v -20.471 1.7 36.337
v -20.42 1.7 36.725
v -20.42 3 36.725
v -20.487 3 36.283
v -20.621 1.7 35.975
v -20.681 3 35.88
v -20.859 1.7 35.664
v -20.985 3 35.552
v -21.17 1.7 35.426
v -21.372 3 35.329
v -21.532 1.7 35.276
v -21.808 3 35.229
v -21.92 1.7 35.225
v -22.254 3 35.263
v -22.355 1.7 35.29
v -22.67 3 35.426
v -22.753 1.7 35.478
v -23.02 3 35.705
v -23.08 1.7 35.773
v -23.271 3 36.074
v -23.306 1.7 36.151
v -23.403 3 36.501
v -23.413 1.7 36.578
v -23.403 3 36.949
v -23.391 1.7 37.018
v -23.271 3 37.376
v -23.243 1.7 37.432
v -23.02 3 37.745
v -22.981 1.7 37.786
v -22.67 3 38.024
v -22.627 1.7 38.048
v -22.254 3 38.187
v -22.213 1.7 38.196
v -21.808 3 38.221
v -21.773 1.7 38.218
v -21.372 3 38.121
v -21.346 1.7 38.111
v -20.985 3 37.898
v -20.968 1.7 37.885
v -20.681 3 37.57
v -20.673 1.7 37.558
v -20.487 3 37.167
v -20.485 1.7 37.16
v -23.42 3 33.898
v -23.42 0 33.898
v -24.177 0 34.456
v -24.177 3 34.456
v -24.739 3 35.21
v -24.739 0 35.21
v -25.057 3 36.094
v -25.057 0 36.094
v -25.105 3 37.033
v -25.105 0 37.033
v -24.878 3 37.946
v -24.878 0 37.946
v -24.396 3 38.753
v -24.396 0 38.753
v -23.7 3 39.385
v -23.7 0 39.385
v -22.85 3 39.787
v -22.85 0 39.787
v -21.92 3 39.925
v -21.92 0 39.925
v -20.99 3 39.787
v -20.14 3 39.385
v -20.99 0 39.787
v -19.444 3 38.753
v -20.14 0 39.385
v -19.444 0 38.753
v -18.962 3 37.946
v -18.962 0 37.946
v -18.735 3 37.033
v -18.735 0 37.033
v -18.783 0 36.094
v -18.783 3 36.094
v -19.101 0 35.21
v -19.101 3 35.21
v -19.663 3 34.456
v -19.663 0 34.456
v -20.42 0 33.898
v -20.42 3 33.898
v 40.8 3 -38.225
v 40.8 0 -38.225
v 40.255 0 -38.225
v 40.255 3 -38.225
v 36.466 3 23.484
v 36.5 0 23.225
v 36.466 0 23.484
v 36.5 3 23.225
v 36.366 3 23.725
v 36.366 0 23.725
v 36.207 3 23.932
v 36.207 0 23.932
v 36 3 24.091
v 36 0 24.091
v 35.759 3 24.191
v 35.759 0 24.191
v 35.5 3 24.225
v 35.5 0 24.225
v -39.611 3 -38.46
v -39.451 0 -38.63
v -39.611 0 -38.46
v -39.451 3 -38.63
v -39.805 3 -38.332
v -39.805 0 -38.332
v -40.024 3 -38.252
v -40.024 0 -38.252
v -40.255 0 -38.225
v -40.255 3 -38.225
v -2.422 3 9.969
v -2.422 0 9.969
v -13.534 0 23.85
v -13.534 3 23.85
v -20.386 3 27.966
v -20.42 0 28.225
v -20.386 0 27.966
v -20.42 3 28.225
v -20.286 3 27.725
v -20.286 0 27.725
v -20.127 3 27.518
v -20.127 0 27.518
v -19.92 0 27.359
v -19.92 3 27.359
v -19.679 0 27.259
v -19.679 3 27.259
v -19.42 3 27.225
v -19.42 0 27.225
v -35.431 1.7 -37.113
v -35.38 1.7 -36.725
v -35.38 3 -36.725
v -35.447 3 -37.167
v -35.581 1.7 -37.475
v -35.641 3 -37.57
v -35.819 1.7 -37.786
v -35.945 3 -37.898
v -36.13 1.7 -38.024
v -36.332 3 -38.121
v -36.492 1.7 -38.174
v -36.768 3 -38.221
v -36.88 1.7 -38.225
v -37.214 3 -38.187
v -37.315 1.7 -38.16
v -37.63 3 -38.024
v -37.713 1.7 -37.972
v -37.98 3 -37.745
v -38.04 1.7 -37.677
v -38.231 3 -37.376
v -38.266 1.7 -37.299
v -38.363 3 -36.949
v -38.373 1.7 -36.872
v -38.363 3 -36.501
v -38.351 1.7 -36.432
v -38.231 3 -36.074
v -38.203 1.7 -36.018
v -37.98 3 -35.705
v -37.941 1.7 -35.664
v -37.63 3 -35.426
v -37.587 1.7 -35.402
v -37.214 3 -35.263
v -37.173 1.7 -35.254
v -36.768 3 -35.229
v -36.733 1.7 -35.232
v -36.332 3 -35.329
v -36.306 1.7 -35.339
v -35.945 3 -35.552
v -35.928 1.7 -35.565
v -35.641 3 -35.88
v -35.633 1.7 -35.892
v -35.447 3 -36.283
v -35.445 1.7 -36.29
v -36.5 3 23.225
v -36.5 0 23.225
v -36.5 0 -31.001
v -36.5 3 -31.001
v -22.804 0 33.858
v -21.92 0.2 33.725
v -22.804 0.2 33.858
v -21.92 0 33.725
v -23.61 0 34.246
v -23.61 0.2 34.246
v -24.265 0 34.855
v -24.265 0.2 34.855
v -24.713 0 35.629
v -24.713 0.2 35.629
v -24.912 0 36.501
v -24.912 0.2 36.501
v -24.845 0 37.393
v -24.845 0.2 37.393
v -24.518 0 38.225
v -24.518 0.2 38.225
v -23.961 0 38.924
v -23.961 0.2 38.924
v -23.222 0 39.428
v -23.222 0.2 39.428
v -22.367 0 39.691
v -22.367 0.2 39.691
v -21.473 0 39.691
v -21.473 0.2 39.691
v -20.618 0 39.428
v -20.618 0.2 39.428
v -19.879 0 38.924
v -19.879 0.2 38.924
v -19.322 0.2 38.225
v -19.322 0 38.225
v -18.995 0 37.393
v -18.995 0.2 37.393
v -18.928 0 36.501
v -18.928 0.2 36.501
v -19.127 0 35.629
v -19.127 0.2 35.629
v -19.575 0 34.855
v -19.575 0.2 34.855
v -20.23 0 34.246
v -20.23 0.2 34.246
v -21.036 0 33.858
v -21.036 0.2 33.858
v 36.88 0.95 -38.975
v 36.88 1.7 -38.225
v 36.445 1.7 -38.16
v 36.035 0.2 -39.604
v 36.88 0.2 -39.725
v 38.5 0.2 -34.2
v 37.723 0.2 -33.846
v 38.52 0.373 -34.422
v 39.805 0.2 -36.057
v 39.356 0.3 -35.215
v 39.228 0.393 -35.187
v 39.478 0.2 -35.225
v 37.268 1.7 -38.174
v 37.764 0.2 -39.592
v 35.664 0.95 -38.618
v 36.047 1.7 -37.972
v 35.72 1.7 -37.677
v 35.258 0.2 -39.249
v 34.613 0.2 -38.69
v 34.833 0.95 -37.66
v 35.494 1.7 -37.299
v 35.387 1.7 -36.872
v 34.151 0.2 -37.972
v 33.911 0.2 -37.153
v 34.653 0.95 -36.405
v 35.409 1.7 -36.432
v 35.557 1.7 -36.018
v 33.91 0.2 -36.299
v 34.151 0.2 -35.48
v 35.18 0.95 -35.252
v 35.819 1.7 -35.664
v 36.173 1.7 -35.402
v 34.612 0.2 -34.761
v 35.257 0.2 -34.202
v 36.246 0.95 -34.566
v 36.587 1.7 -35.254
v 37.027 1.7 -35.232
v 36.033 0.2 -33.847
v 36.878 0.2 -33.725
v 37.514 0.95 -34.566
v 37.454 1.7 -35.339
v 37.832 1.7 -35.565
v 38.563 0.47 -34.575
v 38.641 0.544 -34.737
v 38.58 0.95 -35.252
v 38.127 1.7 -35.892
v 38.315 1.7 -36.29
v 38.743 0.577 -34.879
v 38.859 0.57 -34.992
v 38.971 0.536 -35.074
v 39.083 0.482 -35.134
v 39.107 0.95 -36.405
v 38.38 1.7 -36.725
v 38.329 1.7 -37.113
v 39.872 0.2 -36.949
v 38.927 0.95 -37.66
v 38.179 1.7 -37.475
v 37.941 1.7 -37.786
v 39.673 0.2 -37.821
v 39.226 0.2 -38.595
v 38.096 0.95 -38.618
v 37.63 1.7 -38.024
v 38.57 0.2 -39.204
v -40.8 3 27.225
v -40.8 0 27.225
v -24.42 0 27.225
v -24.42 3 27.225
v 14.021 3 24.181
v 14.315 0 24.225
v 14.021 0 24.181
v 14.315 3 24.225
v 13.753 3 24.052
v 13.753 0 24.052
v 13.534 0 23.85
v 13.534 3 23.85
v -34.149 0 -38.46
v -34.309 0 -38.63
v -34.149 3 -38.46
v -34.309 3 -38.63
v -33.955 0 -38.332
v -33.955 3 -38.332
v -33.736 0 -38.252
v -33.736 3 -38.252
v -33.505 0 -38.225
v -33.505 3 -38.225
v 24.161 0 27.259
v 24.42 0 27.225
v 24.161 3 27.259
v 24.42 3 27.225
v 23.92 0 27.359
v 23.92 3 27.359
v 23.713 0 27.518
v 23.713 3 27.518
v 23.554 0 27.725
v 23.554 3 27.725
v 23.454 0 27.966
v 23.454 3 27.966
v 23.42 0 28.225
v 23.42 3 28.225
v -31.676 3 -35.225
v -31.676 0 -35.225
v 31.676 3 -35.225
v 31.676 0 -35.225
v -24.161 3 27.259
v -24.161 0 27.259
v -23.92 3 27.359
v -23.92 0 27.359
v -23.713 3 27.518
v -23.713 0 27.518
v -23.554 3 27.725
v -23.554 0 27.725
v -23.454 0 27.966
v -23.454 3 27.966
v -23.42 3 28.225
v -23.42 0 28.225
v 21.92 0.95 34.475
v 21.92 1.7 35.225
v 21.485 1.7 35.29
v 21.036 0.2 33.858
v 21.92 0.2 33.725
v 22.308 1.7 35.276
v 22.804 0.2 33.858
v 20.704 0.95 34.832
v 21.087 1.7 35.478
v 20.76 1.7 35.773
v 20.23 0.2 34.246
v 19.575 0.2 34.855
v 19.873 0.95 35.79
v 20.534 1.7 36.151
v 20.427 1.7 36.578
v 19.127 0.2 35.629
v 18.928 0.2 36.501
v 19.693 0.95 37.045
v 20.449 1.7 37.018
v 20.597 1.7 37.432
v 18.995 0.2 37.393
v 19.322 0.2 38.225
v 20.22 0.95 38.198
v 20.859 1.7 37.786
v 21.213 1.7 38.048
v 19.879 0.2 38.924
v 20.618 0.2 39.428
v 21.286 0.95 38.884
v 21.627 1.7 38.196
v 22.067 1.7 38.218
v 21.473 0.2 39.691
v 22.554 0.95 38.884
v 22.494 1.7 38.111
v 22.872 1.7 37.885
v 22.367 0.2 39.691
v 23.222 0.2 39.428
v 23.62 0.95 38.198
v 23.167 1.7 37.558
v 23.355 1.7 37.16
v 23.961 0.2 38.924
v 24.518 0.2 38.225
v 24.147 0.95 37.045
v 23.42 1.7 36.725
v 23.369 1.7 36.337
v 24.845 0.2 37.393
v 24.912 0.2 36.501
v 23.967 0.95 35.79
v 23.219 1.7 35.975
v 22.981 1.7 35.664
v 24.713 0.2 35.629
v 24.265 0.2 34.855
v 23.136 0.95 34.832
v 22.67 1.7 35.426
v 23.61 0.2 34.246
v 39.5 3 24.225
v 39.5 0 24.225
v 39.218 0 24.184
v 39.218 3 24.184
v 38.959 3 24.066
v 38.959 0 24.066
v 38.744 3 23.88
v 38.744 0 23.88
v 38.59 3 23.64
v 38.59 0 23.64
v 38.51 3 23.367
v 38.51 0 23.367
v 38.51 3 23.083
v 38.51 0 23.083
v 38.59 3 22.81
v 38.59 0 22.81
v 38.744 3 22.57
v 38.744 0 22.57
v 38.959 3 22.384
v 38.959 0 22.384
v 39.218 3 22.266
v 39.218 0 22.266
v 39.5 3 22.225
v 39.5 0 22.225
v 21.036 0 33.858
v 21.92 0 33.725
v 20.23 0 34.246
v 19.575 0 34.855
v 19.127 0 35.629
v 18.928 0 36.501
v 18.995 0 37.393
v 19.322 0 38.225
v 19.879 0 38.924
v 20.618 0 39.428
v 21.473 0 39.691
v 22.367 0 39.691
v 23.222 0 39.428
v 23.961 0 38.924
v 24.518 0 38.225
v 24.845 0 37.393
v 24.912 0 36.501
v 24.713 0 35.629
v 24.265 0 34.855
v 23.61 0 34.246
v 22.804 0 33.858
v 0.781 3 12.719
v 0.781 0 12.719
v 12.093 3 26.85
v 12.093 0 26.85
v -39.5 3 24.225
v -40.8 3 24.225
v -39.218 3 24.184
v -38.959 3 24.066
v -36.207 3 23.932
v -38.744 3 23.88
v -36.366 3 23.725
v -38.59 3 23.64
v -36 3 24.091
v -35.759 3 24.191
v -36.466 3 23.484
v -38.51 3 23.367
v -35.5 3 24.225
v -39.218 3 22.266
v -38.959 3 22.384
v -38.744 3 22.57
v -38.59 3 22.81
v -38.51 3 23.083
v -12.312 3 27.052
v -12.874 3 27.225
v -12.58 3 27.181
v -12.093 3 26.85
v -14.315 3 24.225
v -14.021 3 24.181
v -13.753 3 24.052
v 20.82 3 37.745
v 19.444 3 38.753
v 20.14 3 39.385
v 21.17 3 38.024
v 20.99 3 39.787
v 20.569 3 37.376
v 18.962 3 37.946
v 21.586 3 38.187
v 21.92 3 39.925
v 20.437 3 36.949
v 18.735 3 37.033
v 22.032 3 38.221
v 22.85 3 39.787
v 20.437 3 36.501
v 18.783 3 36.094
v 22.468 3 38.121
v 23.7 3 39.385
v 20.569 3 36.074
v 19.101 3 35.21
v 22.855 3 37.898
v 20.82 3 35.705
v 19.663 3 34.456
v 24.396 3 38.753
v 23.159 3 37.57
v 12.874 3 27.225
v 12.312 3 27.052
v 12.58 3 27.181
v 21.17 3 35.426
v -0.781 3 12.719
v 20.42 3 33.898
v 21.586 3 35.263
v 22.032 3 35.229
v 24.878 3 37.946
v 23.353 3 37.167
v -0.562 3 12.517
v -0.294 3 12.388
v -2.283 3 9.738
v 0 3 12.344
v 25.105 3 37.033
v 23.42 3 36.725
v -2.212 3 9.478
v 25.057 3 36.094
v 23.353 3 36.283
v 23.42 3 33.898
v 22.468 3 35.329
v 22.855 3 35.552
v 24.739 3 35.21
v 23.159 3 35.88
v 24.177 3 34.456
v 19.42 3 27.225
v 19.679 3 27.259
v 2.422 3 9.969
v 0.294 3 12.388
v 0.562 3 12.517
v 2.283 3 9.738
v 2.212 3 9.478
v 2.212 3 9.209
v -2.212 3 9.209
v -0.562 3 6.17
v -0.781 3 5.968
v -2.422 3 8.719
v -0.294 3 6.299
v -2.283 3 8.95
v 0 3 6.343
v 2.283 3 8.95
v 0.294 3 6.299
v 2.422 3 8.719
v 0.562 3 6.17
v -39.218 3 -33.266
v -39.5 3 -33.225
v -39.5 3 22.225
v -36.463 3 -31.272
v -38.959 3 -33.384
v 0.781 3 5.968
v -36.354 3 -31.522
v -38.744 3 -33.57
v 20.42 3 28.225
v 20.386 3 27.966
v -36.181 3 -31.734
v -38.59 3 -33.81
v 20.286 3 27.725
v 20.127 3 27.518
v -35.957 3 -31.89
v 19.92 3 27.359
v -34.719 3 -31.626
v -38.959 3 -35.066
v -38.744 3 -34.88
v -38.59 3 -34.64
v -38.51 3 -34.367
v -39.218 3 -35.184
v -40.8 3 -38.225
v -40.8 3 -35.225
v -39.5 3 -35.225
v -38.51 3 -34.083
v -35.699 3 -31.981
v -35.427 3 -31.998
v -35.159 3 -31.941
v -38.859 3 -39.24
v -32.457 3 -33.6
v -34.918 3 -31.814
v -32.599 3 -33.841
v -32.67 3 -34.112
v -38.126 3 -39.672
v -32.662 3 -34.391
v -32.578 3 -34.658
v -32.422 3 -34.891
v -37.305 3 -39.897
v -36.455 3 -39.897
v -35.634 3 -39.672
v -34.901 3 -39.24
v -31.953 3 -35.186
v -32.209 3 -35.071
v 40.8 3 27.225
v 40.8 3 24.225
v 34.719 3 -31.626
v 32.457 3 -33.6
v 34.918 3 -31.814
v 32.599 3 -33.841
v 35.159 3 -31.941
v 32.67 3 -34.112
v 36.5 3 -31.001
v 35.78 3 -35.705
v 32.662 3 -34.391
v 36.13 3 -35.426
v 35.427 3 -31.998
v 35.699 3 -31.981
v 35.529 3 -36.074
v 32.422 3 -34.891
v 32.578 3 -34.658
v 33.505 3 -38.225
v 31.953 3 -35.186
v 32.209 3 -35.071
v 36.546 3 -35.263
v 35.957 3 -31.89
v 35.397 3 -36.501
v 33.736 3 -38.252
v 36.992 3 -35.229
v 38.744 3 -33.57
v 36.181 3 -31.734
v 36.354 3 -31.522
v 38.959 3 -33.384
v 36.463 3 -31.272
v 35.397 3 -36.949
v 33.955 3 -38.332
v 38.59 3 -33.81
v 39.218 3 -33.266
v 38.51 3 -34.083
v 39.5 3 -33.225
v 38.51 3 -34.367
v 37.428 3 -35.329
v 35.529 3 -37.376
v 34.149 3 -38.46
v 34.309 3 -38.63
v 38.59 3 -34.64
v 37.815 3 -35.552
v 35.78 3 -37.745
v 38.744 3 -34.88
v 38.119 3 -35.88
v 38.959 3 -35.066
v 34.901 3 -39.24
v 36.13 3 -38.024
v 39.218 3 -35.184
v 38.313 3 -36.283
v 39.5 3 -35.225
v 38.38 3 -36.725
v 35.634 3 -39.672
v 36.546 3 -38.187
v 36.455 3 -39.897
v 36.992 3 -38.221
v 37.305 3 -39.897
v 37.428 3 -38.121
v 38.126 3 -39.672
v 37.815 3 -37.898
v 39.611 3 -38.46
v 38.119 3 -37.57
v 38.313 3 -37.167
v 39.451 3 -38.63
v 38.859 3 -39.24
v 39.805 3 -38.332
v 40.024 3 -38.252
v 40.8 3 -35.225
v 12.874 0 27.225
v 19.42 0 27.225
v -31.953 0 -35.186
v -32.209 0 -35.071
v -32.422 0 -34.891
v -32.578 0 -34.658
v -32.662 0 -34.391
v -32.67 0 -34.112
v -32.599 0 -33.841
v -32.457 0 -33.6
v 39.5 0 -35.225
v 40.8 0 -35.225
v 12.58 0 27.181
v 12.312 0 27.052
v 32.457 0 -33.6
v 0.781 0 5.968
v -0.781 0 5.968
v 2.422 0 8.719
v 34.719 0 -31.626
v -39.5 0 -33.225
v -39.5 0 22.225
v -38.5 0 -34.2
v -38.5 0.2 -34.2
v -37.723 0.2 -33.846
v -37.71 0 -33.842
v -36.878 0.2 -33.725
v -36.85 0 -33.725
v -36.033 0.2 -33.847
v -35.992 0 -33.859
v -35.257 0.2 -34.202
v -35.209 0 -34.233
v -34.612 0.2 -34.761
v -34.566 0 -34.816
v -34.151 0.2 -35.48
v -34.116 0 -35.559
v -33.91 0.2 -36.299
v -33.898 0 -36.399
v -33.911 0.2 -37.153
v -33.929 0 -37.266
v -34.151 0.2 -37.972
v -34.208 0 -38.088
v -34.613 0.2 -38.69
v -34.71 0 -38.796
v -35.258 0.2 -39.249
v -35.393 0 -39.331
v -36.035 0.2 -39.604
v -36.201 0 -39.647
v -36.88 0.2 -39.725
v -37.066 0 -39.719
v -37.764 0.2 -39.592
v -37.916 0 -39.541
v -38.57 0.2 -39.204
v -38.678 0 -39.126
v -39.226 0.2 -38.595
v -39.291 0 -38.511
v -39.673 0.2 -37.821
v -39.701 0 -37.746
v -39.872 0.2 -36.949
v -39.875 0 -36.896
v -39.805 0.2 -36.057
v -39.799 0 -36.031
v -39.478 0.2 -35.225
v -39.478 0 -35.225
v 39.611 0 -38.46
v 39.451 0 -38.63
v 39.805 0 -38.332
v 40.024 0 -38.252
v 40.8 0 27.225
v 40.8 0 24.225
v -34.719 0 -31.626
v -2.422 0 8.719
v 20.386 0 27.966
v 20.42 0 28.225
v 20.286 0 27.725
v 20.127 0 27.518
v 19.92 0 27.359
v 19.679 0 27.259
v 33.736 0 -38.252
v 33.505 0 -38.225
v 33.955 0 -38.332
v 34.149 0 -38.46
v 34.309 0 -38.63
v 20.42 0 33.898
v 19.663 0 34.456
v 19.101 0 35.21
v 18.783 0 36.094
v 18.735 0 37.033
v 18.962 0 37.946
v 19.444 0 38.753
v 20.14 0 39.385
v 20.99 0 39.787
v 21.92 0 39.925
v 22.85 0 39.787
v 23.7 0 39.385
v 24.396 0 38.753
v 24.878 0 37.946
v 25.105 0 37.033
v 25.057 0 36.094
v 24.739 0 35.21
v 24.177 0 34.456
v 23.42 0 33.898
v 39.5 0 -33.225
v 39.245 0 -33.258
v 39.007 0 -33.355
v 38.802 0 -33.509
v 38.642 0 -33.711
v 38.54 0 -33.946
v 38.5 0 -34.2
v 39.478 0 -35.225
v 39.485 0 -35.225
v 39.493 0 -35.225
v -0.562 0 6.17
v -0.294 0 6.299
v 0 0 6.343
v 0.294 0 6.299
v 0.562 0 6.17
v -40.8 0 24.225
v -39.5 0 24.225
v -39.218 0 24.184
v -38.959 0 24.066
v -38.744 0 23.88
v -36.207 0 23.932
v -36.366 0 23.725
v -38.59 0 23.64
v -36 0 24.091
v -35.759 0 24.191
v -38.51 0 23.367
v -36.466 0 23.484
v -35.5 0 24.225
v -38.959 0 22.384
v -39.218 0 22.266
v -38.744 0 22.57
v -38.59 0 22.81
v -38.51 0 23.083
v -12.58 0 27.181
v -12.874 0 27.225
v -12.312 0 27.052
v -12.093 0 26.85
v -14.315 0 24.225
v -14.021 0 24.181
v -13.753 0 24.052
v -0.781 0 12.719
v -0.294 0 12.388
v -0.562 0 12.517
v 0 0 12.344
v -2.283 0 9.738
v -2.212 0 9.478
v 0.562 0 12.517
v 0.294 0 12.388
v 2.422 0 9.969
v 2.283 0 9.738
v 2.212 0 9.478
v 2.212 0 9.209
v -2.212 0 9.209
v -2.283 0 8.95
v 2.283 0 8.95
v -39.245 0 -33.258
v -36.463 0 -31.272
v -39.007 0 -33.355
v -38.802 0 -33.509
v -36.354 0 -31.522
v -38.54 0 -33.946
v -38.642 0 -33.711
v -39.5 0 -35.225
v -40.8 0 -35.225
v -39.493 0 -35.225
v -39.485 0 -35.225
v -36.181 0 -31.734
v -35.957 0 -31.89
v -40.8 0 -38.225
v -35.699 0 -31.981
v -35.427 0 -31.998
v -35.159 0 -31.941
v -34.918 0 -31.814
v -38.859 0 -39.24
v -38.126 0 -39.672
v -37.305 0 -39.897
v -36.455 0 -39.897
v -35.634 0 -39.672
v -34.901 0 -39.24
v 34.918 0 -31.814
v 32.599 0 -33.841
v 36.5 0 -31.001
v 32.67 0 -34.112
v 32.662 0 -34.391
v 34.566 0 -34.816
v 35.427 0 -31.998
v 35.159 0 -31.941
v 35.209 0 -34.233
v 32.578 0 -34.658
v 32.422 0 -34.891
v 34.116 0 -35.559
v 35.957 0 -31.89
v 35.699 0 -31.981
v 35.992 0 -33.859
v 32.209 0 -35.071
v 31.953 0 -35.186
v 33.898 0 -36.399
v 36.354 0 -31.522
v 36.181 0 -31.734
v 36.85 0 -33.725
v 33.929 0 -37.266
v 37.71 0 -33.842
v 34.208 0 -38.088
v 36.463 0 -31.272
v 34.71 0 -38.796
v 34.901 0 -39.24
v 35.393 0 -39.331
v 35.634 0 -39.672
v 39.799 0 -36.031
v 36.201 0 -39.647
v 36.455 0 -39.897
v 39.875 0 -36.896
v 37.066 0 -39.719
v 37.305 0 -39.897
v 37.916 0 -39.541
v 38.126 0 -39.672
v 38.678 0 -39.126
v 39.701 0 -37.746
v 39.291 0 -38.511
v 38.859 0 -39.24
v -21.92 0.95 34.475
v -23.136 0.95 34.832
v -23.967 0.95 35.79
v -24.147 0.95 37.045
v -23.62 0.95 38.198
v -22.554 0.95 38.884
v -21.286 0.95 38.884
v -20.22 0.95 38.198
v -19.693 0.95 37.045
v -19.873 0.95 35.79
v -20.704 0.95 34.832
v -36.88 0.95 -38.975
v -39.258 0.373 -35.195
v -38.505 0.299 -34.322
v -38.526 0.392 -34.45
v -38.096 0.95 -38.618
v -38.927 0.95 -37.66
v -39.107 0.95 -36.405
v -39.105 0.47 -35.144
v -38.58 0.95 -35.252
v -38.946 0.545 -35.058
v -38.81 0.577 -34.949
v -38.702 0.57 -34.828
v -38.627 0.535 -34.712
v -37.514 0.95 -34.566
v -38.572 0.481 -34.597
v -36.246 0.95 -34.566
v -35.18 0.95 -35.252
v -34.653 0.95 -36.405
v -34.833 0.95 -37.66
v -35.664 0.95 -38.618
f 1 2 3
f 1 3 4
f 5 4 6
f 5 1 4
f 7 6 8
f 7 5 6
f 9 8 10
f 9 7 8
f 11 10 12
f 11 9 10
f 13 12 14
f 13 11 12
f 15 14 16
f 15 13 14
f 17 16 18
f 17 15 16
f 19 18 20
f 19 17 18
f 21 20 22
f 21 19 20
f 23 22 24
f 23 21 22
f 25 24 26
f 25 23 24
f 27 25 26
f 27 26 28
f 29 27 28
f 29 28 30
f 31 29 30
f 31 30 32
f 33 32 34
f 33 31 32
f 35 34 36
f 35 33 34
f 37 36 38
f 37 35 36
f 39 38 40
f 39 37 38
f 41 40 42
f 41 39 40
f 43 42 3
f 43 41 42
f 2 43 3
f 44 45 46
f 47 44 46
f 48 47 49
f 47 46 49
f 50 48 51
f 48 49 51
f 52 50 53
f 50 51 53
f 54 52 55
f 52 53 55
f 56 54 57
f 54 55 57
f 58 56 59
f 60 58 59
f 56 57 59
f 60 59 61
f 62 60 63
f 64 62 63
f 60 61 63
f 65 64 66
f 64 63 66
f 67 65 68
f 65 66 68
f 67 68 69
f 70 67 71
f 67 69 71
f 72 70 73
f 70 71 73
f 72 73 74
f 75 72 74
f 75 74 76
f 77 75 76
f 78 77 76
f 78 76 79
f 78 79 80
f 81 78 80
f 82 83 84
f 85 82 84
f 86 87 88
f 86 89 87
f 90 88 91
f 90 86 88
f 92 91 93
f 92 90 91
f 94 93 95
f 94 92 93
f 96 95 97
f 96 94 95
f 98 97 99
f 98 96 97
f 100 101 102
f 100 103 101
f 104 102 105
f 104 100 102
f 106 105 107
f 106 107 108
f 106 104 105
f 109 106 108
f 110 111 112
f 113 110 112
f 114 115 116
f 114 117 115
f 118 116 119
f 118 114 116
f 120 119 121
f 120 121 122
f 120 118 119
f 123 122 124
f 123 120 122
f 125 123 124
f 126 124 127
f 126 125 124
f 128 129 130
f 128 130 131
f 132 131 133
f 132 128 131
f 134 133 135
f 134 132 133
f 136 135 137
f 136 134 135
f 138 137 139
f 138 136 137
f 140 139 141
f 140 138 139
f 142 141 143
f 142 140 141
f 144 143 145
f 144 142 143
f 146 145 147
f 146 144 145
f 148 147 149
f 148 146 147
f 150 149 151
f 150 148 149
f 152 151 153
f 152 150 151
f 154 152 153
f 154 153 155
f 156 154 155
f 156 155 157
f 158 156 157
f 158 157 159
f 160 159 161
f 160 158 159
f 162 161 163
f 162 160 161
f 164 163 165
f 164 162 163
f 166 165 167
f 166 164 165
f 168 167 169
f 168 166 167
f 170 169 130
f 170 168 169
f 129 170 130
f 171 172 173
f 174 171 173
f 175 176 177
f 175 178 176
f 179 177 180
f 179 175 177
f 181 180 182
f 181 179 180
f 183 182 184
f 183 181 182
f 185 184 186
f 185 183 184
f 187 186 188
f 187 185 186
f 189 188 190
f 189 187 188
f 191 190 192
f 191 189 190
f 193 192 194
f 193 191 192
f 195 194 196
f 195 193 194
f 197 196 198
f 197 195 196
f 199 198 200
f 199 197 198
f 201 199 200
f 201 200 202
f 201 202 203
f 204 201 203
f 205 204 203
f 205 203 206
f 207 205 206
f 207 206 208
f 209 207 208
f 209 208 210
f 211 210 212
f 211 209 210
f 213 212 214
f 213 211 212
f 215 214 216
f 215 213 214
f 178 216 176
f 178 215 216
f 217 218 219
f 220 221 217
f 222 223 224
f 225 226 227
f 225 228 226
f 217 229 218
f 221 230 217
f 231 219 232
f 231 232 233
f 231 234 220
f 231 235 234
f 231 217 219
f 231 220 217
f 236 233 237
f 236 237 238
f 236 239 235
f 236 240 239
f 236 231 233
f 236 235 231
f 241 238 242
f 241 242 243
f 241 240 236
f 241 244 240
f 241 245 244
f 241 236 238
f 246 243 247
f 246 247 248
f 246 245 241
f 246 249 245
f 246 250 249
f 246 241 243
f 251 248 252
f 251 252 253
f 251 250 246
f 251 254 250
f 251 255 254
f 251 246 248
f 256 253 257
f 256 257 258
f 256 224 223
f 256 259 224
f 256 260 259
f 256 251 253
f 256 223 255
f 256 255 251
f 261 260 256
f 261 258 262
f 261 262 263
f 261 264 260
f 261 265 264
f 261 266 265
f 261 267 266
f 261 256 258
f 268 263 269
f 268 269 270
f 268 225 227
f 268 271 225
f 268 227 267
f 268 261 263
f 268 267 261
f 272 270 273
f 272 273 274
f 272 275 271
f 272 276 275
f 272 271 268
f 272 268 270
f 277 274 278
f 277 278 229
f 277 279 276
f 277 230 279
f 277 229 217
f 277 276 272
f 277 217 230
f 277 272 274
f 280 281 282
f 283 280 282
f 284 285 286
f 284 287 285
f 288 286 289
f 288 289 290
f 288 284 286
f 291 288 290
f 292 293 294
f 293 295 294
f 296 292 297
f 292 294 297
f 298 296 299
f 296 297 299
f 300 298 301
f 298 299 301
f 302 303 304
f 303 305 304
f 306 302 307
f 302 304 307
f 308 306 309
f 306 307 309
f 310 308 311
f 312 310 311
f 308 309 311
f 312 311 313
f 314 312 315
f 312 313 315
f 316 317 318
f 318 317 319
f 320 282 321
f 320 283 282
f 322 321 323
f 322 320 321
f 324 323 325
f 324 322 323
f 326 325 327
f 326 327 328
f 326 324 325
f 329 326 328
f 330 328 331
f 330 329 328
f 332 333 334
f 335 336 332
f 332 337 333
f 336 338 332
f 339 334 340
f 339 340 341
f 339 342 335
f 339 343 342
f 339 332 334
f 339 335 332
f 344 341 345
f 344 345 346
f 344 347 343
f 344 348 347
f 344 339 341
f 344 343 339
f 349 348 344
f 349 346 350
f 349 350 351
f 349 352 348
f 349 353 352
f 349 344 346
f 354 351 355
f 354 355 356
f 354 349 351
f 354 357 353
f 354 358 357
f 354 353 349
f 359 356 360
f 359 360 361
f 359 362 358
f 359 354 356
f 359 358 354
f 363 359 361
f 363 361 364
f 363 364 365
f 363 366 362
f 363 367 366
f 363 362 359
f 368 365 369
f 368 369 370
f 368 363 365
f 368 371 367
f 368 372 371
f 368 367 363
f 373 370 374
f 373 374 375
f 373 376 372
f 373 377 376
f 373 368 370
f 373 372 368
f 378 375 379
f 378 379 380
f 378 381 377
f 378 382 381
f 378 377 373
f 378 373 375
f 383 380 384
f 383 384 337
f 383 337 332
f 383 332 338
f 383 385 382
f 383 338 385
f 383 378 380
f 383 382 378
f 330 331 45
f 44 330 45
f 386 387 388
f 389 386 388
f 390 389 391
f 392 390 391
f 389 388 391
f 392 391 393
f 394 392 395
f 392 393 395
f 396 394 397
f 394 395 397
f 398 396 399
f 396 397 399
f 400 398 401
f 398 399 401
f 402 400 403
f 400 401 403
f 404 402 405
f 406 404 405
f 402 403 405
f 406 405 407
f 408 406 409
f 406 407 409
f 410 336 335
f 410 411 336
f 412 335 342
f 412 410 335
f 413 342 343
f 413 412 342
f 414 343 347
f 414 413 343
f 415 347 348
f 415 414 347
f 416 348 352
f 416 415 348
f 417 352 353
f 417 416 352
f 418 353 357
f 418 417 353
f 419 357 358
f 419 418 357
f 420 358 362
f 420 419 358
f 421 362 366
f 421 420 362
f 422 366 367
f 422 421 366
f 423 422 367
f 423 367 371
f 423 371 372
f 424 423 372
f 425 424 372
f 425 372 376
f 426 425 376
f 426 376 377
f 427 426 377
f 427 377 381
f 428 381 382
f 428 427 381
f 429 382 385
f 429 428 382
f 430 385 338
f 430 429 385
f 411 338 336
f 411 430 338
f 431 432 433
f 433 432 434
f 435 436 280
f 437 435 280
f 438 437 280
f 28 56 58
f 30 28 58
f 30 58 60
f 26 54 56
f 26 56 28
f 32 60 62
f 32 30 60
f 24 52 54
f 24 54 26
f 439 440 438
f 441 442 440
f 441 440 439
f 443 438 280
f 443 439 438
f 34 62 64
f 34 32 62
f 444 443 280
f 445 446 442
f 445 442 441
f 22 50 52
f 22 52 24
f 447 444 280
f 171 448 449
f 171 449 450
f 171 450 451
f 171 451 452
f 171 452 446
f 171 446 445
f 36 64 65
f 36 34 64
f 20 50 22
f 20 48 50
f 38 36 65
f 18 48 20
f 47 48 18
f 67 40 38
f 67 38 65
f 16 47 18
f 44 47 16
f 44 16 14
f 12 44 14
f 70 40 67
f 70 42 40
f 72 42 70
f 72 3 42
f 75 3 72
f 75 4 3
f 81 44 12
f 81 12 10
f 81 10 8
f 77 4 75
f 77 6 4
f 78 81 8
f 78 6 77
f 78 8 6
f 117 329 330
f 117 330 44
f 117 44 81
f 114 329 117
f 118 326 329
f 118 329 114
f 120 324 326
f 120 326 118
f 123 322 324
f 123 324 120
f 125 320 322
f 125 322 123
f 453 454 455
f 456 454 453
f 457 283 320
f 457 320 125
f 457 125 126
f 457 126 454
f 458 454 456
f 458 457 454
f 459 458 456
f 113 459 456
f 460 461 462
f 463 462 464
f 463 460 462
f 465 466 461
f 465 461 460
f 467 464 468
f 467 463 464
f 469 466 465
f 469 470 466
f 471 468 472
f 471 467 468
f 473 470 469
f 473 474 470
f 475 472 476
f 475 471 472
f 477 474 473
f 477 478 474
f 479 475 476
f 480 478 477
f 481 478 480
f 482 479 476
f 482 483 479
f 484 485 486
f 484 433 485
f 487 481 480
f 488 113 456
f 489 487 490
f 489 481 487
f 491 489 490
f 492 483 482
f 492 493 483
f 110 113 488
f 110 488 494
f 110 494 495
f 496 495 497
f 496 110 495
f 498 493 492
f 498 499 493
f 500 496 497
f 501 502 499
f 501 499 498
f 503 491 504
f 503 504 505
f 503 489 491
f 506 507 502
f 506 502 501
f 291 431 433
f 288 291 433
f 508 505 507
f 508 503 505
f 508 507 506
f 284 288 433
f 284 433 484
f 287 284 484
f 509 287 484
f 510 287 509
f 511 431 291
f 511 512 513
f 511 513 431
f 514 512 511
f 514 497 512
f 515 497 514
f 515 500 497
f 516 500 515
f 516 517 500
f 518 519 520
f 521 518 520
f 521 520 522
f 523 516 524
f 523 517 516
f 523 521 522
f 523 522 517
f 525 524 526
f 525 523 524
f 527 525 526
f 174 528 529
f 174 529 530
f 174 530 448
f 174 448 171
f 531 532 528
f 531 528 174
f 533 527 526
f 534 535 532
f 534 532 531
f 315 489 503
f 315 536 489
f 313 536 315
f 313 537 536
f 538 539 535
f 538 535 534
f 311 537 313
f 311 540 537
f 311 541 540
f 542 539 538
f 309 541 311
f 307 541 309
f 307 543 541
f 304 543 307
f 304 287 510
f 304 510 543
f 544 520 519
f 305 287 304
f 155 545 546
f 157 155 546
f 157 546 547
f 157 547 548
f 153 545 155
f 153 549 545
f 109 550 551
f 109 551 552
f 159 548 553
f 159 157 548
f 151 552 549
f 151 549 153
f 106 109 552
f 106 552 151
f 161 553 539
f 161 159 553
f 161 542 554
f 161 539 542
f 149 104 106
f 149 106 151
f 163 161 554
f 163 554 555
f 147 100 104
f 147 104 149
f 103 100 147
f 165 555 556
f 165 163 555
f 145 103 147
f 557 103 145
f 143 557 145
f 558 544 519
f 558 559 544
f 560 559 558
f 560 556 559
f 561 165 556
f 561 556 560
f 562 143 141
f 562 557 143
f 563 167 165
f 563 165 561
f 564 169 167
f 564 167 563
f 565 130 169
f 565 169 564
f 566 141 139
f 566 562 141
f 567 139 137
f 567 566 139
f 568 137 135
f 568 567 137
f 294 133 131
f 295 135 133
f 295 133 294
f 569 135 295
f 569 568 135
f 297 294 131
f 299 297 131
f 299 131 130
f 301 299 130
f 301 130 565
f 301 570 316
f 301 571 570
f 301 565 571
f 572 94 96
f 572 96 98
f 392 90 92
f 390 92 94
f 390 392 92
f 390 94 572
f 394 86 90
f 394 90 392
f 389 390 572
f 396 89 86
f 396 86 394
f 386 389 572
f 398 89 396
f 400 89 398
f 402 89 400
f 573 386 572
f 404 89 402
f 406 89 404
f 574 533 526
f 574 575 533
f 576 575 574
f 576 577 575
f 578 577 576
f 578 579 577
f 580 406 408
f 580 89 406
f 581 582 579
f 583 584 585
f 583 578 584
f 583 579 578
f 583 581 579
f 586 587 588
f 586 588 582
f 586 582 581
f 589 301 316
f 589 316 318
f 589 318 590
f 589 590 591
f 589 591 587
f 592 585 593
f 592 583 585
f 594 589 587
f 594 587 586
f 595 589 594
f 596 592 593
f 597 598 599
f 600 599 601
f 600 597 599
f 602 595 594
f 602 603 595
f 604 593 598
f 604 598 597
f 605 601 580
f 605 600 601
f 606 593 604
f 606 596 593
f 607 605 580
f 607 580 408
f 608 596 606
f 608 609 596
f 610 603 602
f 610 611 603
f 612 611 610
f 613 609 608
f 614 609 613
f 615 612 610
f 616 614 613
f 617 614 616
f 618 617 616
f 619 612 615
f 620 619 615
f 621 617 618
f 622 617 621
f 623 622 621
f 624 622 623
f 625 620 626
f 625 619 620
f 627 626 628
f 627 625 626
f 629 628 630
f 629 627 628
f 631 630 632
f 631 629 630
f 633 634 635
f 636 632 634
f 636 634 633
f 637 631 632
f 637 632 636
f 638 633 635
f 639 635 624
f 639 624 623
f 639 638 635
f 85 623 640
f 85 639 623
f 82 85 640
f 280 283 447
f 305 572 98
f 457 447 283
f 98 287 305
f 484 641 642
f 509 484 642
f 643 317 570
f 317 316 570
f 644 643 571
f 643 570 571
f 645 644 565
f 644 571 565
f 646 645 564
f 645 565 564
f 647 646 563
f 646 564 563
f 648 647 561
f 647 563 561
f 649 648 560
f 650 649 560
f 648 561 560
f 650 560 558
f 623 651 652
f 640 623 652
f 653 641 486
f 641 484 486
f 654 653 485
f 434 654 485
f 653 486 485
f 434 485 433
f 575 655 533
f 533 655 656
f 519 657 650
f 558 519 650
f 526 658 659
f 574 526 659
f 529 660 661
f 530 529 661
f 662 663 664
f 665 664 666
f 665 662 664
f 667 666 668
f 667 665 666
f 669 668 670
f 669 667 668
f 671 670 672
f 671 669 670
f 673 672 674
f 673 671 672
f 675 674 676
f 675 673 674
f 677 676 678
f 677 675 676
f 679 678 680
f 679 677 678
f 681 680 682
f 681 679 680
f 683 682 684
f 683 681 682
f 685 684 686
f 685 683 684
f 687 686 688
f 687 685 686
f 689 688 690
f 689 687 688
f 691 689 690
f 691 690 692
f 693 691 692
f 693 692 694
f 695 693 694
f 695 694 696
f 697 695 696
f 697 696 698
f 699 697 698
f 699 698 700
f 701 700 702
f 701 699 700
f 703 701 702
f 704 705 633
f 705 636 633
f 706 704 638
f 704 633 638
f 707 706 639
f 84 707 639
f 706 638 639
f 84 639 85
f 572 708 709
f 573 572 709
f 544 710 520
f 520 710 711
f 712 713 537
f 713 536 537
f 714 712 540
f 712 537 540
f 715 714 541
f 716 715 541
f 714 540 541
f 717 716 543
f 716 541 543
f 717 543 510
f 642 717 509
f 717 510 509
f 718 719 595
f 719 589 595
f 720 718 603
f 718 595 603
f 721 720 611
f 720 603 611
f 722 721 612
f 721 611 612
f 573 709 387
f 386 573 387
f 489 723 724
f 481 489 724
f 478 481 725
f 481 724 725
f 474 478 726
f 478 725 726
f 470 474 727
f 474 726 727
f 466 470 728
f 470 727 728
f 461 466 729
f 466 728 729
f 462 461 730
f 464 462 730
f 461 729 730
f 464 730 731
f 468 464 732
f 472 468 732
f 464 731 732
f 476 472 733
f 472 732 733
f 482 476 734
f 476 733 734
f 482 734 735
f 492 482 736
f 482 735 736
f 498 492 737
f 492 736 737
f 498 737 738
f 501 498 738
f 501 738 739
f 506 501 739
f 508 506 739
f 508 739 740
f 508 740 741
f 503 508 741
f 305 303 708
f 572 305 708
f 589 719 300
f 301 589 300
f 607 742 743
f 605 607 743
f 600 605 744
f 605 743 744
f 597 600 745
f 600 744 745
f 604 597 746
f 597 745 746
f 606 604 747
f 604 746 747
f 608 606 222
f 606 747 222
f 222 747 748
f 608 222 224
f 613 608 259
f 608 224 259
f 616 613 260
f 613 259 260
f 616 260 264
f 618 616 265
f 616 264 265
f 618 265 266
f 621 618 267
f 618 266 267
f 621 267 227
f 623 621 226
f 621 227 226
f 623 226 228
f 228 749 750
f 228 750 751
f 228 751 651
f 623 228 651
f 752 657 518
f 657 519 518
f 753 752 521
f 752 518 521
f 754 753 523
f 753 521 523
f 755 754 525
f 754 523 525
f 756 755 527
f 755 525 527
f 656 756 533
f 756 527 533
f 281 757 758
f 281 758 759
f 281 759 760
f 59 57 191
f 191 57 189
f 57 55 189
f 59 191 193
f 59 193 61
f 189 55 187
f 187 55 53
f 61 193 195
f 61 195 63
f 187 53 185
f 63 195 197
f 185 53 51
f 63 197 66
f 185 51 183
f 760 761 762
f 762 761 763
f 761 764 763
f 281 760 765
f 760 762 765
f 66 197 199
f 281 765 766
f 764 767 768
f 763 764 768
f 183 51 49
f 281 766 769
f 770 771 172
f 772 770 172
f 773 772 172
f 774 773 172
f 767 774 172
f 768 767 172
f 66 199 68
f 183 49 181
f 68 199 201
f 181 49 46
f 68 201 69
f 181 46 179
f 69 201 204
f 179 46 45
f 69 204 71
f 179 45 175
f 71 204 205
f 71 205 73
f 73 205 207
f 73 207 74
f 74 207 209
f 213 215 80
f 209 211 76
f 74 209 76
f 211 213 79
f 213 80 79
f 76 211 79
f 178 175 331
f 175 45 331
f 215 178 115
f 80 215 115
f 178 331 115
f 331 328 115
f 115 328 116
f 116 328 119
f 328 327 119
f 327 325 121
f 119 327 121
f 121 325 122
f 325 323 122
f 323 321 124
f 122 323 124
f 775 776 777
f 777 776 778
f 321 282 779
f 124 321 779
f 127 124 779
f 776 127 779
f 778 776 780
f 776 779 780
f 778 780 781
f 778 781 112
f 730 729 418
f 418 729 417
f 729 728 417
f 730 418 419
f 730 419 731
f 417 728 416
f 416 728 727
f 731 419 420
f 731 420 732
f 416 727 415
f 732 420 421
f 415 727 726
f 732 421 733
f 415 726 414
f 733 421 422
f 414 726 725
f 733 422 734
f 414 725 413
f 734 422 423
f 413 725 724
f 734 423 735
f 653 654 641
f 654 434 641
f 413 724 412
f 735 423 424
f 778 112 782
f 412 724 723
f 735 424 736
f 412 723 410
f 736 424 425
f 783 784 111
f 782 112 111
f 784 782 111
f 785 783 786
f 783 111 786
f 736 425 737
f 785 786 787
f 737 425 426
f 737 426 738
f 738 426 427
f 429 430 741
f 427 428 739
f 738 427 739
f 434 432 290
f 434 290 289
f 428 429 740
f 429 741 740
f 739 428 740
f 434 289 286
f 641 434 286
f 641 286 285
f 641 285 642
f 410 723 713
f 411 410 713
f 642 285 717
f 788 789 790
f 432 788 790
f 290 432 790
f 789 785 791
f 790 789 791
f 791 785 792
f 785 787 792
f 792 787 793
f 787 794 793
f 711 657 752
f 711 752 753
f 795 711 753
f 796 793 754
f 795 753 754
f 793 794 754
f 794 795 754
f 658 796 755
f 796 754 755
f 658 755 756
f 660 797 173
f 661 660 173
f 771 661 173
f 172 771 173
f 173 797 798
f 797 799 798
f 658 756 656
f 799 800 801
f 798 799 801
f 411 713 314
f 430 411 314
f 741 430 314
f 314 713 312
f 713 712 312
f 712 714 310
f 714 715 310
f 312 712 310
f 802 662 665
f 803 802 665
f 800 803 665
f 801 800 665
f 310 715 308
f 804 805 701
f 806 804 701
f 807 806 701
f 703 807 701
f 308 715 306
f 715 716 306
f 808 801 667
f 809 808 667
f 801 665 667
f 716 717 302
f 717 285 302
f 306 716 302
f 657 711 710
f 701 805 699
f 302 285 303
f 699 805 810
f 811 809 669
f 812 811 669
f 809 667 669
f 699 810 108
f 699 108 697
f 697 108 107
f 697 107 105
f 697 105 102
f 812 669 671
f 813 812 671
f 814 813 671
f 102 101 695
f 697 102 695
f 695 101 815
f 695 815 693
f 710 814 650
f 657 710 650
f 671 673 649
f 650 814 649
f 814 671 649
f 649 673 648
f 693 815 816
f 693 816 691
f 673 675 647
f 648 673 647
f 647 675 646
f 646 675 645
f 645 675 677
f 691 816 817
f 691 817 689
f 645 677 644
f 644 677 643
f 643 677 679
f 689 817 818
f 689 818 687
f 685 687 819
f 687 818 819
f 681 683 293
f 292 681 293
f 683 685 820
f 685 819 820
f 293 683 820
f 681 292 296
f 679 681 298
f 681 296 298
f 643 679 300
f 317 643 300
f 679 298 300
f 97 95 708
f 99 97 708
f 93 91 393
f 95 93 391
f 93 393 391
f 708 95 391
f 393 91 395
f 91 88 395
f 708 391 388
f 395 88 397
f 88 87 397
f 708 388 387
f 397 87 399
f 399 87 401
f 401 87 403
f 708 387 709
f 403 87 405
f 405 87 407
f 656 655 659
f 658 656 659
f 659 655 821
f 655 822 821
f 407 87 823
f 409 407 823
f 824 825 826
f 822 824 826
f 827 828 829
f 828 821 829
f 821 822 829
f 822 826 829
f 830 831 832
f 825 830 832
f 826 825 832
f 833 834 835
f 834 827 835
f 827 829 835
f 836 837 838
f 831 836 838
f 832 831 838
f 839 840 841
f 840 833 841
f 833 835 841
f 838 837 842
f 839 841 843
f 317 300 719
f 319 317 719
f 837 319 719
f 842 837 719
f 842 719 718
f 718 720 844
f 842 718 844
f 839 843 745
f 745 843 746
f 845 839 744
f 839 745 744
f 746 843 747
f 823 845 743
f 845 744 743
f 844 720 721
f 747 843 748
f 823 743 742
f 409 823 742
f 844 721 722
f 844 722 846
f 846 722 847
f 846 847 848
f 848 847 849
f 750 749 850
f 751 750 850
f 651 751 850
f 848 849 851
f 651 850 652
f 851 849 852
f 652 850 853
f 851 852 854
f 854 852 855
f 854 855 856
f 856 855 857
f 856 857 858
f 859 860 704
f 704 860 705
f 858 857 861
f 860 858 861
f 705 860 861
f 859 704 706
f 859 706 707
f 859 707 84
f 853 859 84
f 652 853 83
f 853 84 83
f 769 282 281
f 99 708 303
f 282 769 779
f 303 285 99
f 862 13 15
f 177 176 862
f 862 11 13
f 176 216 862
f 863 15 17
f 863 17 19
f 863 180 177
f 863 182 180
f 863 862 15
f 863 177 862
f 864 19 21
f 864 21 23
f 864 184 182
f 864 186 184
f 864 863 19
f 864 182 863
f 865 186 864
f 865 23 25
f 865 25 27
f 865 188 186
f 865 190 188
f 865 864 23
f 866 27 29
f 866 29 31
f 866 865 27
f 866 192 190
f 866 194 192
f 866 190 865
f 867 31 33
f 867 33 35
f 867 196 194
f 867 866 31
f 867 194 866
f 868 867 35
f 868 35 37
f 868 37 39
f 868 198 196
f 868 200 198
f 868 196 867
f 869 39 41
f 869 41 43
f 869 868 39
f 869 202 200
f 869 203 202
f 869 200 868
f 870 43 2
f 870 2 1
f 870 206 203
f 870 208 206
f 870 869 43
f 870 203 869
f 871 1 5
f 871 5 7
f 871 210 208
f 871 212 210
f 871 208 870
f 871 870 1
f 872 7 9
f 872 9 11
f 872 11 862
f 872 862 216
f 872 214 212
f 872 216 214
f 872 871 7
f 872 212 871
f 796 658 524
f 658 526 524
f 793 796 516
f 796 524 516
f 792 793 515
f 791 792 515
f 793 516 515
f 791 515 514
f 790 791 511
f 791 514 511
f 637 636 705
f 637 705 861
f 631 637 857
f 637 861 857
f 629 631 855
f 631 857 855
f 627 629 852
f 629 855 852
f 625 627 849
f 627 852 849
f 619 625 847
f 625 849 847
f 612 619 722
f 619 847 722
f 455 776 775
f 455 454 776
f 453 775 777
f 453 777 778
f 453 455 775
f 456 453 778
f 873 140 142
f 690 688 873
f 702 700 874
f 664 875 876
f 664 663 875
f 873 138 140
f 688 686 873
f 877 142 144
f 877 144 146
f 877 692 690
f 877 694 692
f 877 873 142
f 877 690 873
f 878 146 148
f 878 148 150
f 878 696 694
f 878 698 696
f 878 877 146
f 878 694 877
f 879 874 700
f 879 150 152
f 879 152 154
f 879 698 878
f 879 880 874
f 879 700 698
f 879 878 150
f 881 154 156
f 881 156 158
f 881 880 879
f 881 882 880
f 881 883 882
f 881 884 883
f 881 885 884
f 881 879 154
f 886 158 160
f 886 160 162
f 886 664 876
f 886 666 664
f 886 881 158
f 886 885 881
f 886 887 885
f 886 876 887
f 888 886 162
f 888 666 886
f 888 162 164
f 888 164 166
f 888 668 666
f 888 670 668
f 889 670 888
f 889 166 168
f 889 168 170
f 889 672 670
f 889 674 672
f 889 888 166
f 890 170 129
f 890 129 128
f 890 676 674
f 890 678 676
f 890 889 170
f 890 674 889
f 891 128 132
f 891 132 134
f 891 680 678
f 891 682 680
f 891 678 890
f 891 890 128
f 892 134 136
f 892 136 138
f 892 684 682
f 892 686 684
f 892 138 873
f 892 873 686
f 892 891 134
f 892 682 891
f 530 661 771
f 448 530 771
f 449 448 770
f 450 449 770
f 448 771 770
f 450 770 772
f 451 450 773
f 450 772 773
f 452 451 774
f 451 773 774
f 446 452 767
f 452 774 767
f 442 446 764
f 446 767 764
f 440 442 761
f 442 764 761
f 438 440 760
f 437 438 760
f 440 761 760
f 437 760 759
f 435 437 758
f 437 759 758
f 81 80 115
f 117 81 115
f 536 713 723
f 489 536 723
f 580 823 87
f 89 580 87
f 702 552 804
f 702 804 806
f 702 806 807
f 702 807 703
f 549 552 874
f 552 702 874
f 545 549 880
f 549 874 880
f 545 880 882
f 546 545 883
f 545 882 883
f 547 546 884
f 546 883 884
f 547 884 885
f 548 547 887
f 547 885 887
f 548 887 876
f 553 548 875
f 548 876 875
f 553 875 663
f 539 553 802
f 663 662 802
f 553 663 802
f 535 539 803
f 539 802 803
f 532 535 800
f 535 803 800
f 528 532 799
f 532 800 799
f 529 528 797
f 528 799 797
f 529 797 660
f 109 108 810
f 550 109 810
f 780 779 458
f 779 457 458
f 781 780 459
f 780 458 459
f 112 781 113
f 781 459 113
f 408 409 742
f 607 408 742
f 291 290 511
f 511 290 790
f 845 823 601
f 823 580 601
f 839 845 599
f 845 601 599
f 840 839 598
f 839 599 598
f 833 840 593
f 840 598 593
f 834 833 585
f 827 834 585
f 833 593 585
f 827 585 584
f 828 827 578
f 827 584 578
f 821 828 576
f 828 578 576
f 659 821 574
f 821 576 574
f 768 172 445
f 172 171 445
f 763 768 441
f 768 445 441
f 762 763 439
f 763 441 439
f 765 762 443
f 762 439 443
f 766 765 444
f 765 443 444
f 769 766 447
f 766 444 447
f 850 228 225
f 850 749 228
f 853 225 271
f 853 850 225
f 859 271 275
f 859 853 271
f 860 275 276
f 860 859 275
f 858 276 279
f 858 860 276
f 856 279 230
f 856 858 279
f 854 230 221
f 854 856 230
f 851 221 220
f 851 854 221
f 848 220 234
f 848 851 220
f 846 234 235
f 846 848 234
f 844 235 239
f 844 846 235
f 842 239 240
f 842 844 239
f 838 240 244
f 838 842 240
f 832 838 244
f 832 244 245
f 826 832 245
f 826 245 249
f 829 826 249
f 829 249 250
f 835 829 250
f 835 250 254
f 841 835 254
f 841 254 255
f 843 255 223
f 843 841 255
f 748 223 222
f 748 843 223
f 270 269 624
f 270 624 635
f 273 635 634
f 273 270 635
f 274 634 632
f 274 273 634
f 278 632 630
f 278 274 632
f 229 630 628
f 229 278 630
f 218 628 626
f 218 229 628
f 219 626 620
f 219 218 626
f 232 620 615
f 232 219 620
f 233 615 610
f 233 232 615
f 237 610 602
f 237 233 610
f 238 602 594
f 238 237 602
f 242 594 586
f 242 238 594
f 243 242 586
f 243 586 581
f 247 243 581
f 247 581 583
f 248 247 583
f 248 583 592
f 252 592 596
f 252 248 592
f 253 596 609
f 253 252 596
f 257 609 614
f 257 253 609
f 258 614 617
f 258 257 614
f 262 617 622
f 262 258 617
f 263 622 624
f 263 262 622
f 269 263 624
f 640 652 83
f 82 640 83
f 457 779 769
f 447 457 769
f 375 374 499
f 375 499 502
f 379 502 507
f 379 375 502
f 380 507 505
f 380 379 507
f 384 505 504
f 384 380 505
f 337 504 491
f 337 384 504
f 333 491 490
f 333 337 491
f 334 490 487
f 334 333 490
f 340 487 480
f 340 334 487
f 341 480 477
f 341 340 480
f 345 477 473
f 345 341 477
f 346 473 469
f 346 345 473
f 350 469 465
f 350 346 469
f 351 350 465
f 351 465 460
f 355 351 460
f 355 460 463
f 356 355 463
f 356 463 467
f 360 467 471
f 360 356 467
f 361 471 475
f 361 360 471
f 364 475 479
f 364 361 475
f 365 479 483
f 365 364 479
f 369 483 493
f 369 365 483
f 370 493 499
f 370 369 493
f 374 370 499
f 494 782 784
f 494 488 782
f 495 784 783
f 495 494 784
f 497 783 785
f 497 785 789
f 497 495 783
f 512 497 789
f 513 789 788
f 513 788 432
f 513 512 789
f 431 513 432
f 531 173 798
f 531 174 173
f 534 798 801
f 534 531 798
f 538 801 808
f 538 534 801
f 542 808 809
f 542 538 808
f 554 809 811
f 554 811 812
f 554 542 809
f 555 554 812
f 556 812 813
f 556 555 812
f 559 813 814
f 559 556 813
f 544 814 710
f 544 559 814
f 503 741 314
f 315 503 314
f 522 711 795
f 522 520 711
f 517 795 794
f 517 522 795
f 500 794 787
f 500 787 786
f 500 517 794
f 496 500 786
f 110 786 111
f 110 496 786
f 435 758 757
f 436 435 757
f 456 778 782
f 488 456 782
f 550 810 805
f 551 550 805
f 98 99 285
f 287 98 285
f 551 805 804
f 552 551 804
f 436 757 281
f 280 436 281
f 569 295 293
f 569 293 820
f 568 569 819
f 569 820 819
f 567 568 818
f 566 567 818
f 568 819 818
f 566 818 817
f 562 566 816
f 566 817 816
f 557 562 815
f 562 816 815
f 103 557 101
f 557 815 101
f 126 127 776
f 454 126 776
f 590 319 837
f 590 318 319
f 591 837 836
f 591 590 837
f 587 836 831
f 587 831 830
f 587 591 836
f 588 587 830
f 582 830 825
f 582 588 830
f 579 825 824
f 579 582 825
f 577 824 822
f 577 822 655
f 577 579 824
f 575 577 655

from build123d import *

# Parameters (mm, degrees)
SKETCH1_R                  = 1.5
SHAPE_DEPTH                = 3
MILL_FILLETS_R             = 1
M3_COUNTERSUNKS_AT_2_COUNT = 2
M3_COUNTERSUNKS_AT_2_PITCH = 43.84
M3_COUNTERSUNKS_AT_3_COUNT = 2
M3_COUNTERSUNKS_AT_3_PITCH = 94.086888034
M3_COUNTERSUNKS_AT_4_COUNT = 2
M3_COUNTERSUNKS_AT_4_PITCH = 74.958015582


with BuildPart() as part:
    # Sketch1 → Shape (new body)
    with BuildSketch(Plane(origin=(0, 0, 0), x_dir=(1, 0, 0), z_dir=(0, 1, 0))):
        with BuildLine():
            ThreePointArc((-34.053341195, 38.225), (-36.88, 39.925), (-39.706658805, 38.225))
            Line((-39.706658805, 38.225), (-40.8, 38.225))
            Line((-40.8, 38.225), (-40.8, 35.225))
            Line((-40.8, 35.225), (-39.5, 35.225))
            ThreePointArc((-39.5, 35.225), (-38.5, 34.225), (-39.5, 33.225))
            Line((-39.5, 33.225), (-39.5, -22.225))
            ThreePointArc((-39.5, -22.225), (-38.5, -23.225), (-39.5, -24.225))
            Line((-39.5, -24.225), (-40.8, -24.225))
            Line((-40.8, -24.225), (-40.8, -27.225))
            Line((-40.8, -27.225), (-23.42, -27.225))
            Line((-23.42, -27.225), (-23.42, -33.898341195))
            ThreePointArc((-23.42, -33.898341195), (-21.92, -39.925), (-20.42, -33.898341195))
            Line((-20.42, -33.898341195), (-20.42, -27.225))
            Line((-20.42, -27.225), (-12.393378733, -27.225))
            Line((-12.393378733, -27.225), (0, -11.743815171))
            Line((0, -11.743815171), (12.393378733, -27.225))
            Line((12.393378733, -27.225), (20.42, -27.225))
            Line((20.42, -27.225), (20.42, -33.898341195))
            ThreePointArc((20.42, -33.898341195), (21.92, -39.925), (23.42, -33.898341195))
            Line((23.42, -33.898341195), (23.42, -27.225))
            Line((23.42, -27.225), (40.8, -27.225))
            Line((40.8, -27.225), (40.8, -24.225))
            Line((40.8, -24.225), (39.5, -24.225))
            ThreePointArc((39.5, -24.225), (38.5, -23.225), (39.5, -22.225))
            Line((39.5, -22.225), (39.5, 33.225))
            ThreePointArc((39.5, 33.225), (38.5, 34.225), (39.5, 35.225))
            Line((39.5, 35.225), (40.8, 35.225))
            Line((40.8, 35.225), (40.8, 38.225))
            Line((40.8, 38.225), (39.706658805, 38.225))
            ThreePointArc((39.706658805, 38.225), (36.88, 39.925), (34.053341195, 38.225))
            Line((34.053341195, 38.225), (-34.053341195, 38.225))
        make_face()
        with Locations((36.88, 36.725)):
            Circle(SKETCH1_R, mode=Mode.SUBTRACT)
        Polygon((36.5, -24.225), (13.834640327, -24.225), (1.921447679, -9.343639456), (36.5, 33.850147414), align=None, mode=Mode.SUBTRACT)
        with Locations((-21.92, -36.725)):
            Circle(SKETCH1_R, mode=Mode.SUBTRACT)
        Polygon((-36.5, 33.850147414), (-1.921447679, -9.343639456), (-13.834640327, -24.225), (-36.5, -24.225), align=None, mode=Mode.SUBTRACT)
        with Locations((-36.88, 36.725)):
            Circle(SKETCH1_R, mode=Mode.SUBTRACT)
        Polygon((33.757735438, 35.225), (0, -6.943463741), (-33.757735438, 35.225), align=None, mode=Mode.SUBTRACT)
        with Locations((21.92, -36.725)):
            Circle(SKETCH1_R, mode=Mode.SUBTRACT)
    extrude(amount=SHAPE_DEPTH)

    # Mill fillets
    mill_fillets_edges = [part.edges().sort_by_distance(p)[0] for p in [
        (33.757735438, 1.5, -35.225),
        (-33.757735438, 1.5, -35.225),
        (0, 1.5, 6.943463741),
        (-36.5, 1.5, -33.850147414),
        (-36.5, 1.5, 24.225),
        (-13.834640327, 1.5, 24.225),
        (-1.921447679, 1.5, 9.343639456),
        (36.5, 1.5, -33.850147414),
        (1.921447679, 1.5, 9.343639456),
        (13.834640327, 1.5, 24.225),
        (36.5, 1.5, 24.225),
        (20.42, 1.5, 27.225),
        (12.393378733, 1.5, 27.225),
        (0, 1.5, 11.743815171),
        (-12.393378733, 1.5, 27.225),
        (-20.42, 1.5, 27.225),
        (-23.42, 1.5, 27.225),
        (-39.706658805, 1.5, -38.225),
        (-34.053341195, 1.5, -38.225),
        (34.053341195, 1.5, -38.225),
        (39.706658805, 1.5, -38.225),
        (23.42, 1.5, 27.225),
    ]]
    fillet(mill_fillets_edges, radius=MILL_FILLETS_R)

    # Sketch3 → M3 countersunks (revolve, cut)
    with BuildSketch(Plane(origin=(-21.92, 0, 36.725), x_dir=(0, 0, -1), z_dir=(1, 0, 0))):
        Polygon((0, 0), (0, 3), (1.5, 3), (1.5, 1.7), (3, 0.2), (3, 0), align=None)
    m3_countersunks = revolve(axis=Axis((-21.92, -6.35, 36.725), (0, 1, 0)), mode=Mode.SUBTRACT)

    # M3 countersunks at 2: M3 countersunks ×2
    with Locations(*[(i * M3_COUNTERSUNKS_AT_2_PITCH, 0, 0) for i in range(1, M3_COUNTERSUNKS_AT_2_COUNT)]):
        add(m3_countersunks, mode=Mode.SUBTRACT)

    # M3 countersunks at 3: M3 countersunks ×2
    with Locations(*[Vector(0.624954244, 0, -0.780661382) * (i * M3_COUNTERSUNKS_AT_3_PITCH) for i in range(1, M3_COUNTERSUNKS_AT_3_COUNT)]):
        add(m3_countersunks, mode=Mode.SUBTRACT)

    # M3 countersunks at 4: M3 countersunks ×2
    with Locations(*[Vector(-0.199578389, 0, -0.979881864) * (i * M3_COUNTERSUNKS_AT_4_PITCH) for i in range(1, M3_COUNTERSUNKS_AT_4_COUNT)]):
        add(m3_countersunks, mode=Mode.SUBTRACT)


solid = part.part
